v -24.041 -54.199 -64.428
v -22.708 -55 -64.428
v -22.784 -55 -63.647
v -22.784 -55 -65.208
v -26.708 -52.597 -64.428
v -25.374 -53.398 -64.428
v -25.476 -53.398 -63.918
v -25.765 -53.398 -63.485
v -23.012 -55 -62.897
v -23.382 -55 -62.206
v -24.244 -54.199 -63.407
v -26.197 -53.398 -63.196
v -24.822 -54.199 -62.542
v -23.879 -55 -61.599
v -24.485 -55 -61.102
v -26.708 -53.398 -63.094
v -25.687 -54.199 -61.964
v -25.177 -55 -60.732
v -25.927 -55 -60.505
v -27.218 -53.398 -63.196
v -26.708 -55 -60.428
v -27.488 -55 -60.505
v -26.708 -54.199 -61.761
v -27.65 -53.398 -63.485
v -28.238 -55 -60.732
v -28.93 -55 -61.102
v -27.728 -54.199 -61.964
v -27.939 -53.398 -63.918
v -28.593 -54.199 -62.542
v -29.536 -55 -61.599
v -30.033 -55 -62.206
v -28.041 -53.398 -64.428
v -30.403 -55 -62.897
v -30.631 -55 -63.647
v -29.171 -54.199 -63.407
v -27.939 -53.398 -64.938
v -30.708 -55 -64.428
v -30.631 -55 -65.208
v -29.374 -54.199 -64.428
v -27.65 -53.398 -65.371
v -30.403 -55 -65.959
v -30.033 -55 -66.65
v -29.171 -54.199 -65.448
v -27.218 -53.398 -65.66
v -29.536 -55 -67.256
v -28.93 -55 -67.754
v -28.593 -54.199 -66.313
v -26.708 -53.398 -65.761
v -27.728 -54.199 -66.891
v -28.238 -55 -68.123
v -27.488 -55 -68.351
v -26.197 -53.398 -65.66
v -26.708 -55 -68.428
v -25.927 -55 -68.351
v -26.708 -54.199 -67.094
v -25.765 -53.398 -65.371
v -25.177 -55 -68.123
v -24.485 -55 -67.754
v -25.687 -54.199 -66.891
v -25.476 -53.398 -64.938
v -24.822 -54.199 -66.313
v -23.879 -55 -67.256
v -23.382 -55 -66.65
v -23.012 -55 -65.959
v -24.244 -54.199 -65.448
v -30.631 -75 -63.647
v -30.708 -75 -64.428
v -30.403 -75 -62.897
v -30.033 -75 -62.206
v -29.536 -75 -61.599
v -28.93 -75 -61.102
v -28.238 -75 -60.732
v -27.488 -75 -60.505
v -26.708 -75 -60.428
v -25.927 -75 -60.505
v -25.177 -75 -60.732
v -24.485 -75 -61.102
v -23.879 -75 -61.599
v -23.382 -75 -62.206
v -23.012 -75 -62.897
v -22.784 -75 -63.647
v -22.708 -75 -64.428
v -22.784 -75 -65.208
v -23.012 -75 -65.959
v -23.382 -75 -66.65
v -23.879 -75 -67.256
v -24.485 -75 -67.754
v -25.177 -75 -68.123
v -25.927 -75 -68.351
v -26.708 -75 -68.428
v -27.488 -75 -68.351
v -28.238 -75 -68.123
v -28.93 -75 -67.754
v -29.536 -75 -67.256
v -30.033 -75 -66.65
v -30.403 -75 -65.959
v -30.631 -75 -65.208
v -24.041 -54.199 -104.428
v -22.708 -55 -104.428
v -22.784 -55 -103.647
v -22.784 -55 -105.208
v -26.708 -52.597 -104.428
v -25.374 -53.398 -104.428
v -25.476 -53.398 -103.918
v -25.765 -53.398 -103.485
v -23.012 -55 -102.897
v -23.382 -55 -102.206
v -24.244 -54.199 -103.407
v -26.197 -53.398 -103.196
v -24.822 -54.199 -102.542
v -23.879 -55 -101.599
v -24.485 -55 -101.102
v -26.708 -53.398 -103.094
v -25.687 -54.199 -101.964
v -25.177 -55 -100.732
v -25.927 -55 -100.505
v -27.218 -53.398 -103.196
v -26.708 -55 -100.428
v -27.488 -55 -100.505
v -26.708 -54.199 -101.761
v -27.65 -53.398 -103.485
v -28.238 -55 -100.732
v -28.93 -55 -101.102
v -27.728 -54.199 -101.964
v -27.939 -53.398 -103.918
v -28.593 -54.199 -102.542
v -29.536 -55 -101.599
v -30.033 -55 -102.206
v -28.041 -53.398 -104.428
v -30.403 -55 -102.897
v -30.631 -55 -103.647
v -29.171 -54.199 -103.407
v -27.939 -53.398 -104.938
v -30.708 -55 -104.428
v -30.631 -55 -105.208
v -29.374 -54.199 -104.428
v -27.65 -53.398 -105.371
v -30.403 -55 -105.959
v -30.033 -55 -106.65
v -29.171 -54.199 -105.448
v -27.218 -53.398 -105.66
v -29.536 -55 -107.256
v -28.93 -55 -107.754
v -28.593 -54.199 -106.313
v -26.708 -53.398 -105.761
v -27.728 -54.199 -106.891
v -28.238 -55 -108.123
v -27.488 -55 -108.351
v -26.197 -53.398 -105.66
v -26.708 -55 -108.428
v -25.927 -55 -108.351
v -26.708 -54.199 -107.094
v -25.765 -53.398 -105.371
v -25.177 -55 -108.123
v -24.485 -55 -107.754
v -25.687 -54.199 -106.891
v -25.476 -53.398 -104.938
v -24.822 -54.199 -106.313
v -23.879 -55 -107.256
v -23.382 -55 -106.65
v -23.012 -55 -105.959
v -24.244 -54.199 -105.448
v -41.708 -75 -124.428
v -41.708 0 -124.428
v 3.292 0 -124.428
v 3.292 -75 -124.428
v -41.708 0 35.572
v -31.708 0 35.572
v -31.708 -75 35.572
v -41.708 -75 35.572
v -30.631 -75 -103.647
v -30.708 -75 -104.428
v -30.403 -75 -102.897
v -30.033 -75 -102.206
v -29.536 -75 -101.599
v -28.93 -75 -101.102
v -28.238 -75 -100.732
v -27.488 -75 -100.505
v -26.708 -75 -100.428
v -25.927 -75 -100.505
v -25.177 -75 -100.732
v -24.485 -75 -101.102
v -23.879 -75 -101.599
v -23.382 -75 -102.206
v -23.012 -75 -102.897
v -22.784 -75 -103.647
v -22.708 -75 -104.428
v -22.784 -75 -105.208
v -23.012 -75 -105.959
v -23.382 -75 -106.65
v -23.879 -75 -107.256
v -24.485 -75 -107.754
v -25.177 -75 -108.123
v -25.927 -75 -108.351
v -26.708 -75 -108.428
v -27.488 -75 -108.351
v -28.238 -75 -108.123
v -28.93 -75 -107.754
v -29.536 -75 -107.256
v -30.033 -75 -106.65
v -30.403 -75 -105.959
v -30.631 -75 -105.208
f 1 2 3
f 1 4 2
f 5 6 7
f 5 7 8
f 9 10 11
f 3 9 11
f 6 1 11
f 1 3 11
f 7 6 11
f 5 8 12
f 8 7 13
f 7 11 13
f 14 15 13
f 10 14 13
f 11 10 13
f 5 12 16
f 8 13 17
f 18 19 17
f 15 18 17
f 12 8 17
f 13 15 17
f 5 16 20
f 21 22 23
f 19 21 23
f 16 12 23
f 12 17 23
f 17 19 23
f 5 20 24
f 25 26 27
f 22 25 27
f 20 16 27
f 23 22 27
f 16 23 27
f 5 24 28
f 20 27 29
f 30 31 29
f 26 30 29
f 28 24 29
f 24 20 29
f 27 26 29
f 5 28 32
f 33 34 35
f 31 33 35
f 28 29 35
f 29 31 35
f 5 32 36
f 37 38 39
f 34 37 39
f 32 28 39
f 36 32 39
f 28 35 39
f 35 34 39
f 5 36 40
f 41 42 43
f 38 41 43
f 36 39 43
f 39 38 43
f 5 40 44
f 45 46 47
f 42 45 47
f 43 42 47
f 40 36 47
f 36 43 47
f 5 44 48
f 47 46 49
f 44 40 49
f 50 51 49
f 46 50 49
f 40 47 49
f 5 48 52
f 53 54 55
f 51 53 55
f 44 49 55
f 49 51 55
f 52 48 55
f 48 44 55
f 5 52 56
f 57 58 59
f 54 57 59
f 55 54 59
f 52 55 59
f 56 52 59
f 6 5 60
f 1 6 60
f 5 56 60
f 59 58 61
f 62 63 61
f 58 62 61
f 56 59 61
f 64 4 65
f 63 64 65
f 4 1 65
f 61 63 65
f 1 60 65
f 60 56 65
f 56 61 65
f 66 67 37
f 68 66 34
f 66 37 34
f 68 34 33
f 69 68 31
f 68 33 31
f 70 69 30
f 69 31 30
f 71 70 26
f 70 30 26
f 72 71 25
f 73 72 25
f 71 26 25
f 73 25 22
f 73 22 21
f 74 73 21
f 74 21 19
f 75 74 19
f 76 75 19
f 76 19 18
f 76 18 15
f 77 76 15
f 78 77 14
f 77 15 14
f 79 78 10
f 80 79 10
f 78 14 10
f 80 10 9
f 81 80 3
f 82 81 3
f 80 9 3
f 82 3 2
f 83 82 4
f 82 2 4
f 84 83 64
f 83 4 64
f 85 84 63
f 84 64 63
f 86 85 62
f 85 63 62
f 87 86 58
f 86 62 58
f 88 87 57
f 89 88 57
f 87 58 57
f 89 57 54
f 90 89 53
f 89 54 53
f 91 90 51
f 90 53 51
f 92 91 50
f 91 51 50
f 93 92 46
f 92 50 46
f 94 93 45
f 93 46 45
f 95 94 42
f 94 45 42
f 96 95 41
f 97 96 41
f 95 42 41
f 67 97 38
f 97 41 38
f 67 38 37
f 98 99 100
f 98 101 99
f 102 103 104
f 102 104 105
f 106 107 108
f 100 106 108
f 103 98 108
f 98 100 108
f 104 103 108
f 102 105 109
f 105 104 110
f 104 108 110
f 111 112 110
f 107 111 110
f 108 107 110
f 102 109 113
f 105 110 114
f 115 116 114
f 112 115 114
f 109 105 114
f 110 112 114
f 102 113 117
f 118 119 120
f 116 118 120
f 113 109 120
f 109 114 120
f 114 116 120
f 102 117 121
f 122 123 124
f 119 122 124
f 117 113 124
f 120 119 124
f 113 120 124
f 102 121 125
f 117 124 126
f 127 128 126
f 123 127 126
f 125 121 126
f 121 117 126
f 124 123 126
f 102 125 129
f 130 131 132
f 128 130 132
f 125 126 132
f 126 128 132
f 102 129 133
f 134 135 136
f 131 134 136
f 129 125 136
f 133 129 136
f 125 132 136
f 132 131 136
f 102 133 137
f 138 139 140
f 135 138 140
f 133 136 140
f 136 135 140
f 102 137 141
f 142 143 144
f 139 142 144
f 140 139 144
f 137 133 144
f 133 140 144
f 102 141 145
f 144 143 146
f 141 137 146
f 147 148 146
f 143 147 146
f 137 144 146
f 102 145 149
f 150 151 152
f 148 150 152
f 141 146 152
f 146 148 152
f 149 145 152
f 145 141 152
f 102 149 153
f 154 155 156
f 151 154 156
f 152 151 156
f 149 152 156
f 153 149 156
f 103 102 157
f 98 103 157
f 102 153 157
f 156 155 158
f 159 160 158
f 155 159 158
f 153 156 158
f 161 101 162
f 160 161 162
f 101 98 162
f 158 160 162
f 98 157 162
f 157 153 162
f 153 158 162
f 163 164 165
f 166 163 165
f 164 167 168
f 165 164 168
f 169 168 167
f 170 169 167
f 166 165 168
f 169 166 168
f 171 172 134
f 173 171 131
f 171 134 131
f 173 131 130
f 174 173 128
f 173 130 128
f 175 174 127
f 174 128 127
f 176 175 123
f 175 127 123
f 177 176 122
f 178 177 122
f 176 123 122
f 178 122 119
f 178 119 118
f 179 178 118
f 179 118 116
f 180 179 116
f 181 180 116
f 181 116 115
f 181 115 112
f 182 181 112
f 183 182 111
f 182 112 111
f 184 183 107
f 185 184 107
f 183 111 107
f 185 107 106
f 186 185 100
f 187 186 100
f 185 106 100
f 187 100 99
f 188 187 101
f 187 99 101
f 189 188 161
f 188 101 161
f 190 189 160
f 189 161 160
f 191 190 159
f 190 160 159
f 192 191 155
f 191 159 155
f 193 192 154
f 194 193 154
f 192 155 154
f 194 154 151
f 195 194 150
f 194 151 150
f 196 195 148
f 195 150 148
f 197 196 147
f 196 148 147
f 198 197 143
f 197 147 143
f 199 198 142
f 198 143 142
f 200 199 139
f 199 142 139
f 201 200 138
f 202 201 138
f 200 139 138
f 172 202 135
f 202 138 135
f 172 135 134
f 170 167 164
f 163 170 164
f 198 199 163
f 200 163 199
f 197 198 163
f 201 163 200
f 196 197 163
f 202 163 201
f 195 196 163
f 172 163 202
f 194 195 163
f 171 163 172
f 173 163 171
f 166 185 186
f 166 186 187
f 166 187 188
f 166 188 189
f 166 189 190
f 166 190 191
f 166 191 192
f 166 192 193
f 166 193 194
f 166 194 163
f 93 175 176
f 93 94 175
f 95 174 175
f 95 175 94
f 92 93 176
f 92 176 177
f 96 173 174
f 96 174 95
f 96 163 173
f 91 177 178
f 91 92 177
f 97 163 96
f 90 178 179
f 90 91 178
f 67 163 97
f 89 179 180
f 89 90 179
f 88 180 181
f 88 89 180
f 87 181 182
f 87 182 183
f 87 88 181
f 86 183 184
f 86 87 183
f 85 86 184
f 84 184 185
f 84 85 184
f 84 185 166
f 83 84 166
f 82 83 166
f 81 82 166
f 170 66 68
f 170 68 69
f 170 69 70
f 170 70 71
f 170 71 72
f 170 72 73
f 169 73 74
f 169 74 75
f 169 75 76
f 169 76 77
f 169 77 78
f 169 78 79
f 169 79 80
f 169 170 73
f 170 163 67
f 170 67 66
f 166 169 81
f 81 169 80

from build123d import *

# Parameters (mm, degrees)
F1_DEPTH = 75
F3_D     = 8
F3_DEPTH = 20
F3_TIP   = 2.4034424761


with BuildPart() as f1:
    # F0 (on Front) → F1 (new body)
    with BuildSketch(Plane.XZ):
        Polygon((-31.7075045779, 35.5722052749), (-41.7075045779, 35.5722052749), (-41.7075045779, -124.4277947251), (3.2924954221, -124.4277947251), align=None)
    extrude(amount=F1_DEPTH)

    # F3
    with Locations(Plane.XZ.offset(75)):
        with Locations((-26.7075045779, -64.4277947251), (-26.7075045779, -104.4277947251)):
            Hole(F3_D / 2, depth=F3_DEPTH)
            with Locations((0, 0, -(F3_DEPTH + F3_TIP / 2))):  # 118° drill point
                Cone(0, F3_D / 2, F3_TIP, mode=Mode.SUBTRACT)


solid = f1.part
